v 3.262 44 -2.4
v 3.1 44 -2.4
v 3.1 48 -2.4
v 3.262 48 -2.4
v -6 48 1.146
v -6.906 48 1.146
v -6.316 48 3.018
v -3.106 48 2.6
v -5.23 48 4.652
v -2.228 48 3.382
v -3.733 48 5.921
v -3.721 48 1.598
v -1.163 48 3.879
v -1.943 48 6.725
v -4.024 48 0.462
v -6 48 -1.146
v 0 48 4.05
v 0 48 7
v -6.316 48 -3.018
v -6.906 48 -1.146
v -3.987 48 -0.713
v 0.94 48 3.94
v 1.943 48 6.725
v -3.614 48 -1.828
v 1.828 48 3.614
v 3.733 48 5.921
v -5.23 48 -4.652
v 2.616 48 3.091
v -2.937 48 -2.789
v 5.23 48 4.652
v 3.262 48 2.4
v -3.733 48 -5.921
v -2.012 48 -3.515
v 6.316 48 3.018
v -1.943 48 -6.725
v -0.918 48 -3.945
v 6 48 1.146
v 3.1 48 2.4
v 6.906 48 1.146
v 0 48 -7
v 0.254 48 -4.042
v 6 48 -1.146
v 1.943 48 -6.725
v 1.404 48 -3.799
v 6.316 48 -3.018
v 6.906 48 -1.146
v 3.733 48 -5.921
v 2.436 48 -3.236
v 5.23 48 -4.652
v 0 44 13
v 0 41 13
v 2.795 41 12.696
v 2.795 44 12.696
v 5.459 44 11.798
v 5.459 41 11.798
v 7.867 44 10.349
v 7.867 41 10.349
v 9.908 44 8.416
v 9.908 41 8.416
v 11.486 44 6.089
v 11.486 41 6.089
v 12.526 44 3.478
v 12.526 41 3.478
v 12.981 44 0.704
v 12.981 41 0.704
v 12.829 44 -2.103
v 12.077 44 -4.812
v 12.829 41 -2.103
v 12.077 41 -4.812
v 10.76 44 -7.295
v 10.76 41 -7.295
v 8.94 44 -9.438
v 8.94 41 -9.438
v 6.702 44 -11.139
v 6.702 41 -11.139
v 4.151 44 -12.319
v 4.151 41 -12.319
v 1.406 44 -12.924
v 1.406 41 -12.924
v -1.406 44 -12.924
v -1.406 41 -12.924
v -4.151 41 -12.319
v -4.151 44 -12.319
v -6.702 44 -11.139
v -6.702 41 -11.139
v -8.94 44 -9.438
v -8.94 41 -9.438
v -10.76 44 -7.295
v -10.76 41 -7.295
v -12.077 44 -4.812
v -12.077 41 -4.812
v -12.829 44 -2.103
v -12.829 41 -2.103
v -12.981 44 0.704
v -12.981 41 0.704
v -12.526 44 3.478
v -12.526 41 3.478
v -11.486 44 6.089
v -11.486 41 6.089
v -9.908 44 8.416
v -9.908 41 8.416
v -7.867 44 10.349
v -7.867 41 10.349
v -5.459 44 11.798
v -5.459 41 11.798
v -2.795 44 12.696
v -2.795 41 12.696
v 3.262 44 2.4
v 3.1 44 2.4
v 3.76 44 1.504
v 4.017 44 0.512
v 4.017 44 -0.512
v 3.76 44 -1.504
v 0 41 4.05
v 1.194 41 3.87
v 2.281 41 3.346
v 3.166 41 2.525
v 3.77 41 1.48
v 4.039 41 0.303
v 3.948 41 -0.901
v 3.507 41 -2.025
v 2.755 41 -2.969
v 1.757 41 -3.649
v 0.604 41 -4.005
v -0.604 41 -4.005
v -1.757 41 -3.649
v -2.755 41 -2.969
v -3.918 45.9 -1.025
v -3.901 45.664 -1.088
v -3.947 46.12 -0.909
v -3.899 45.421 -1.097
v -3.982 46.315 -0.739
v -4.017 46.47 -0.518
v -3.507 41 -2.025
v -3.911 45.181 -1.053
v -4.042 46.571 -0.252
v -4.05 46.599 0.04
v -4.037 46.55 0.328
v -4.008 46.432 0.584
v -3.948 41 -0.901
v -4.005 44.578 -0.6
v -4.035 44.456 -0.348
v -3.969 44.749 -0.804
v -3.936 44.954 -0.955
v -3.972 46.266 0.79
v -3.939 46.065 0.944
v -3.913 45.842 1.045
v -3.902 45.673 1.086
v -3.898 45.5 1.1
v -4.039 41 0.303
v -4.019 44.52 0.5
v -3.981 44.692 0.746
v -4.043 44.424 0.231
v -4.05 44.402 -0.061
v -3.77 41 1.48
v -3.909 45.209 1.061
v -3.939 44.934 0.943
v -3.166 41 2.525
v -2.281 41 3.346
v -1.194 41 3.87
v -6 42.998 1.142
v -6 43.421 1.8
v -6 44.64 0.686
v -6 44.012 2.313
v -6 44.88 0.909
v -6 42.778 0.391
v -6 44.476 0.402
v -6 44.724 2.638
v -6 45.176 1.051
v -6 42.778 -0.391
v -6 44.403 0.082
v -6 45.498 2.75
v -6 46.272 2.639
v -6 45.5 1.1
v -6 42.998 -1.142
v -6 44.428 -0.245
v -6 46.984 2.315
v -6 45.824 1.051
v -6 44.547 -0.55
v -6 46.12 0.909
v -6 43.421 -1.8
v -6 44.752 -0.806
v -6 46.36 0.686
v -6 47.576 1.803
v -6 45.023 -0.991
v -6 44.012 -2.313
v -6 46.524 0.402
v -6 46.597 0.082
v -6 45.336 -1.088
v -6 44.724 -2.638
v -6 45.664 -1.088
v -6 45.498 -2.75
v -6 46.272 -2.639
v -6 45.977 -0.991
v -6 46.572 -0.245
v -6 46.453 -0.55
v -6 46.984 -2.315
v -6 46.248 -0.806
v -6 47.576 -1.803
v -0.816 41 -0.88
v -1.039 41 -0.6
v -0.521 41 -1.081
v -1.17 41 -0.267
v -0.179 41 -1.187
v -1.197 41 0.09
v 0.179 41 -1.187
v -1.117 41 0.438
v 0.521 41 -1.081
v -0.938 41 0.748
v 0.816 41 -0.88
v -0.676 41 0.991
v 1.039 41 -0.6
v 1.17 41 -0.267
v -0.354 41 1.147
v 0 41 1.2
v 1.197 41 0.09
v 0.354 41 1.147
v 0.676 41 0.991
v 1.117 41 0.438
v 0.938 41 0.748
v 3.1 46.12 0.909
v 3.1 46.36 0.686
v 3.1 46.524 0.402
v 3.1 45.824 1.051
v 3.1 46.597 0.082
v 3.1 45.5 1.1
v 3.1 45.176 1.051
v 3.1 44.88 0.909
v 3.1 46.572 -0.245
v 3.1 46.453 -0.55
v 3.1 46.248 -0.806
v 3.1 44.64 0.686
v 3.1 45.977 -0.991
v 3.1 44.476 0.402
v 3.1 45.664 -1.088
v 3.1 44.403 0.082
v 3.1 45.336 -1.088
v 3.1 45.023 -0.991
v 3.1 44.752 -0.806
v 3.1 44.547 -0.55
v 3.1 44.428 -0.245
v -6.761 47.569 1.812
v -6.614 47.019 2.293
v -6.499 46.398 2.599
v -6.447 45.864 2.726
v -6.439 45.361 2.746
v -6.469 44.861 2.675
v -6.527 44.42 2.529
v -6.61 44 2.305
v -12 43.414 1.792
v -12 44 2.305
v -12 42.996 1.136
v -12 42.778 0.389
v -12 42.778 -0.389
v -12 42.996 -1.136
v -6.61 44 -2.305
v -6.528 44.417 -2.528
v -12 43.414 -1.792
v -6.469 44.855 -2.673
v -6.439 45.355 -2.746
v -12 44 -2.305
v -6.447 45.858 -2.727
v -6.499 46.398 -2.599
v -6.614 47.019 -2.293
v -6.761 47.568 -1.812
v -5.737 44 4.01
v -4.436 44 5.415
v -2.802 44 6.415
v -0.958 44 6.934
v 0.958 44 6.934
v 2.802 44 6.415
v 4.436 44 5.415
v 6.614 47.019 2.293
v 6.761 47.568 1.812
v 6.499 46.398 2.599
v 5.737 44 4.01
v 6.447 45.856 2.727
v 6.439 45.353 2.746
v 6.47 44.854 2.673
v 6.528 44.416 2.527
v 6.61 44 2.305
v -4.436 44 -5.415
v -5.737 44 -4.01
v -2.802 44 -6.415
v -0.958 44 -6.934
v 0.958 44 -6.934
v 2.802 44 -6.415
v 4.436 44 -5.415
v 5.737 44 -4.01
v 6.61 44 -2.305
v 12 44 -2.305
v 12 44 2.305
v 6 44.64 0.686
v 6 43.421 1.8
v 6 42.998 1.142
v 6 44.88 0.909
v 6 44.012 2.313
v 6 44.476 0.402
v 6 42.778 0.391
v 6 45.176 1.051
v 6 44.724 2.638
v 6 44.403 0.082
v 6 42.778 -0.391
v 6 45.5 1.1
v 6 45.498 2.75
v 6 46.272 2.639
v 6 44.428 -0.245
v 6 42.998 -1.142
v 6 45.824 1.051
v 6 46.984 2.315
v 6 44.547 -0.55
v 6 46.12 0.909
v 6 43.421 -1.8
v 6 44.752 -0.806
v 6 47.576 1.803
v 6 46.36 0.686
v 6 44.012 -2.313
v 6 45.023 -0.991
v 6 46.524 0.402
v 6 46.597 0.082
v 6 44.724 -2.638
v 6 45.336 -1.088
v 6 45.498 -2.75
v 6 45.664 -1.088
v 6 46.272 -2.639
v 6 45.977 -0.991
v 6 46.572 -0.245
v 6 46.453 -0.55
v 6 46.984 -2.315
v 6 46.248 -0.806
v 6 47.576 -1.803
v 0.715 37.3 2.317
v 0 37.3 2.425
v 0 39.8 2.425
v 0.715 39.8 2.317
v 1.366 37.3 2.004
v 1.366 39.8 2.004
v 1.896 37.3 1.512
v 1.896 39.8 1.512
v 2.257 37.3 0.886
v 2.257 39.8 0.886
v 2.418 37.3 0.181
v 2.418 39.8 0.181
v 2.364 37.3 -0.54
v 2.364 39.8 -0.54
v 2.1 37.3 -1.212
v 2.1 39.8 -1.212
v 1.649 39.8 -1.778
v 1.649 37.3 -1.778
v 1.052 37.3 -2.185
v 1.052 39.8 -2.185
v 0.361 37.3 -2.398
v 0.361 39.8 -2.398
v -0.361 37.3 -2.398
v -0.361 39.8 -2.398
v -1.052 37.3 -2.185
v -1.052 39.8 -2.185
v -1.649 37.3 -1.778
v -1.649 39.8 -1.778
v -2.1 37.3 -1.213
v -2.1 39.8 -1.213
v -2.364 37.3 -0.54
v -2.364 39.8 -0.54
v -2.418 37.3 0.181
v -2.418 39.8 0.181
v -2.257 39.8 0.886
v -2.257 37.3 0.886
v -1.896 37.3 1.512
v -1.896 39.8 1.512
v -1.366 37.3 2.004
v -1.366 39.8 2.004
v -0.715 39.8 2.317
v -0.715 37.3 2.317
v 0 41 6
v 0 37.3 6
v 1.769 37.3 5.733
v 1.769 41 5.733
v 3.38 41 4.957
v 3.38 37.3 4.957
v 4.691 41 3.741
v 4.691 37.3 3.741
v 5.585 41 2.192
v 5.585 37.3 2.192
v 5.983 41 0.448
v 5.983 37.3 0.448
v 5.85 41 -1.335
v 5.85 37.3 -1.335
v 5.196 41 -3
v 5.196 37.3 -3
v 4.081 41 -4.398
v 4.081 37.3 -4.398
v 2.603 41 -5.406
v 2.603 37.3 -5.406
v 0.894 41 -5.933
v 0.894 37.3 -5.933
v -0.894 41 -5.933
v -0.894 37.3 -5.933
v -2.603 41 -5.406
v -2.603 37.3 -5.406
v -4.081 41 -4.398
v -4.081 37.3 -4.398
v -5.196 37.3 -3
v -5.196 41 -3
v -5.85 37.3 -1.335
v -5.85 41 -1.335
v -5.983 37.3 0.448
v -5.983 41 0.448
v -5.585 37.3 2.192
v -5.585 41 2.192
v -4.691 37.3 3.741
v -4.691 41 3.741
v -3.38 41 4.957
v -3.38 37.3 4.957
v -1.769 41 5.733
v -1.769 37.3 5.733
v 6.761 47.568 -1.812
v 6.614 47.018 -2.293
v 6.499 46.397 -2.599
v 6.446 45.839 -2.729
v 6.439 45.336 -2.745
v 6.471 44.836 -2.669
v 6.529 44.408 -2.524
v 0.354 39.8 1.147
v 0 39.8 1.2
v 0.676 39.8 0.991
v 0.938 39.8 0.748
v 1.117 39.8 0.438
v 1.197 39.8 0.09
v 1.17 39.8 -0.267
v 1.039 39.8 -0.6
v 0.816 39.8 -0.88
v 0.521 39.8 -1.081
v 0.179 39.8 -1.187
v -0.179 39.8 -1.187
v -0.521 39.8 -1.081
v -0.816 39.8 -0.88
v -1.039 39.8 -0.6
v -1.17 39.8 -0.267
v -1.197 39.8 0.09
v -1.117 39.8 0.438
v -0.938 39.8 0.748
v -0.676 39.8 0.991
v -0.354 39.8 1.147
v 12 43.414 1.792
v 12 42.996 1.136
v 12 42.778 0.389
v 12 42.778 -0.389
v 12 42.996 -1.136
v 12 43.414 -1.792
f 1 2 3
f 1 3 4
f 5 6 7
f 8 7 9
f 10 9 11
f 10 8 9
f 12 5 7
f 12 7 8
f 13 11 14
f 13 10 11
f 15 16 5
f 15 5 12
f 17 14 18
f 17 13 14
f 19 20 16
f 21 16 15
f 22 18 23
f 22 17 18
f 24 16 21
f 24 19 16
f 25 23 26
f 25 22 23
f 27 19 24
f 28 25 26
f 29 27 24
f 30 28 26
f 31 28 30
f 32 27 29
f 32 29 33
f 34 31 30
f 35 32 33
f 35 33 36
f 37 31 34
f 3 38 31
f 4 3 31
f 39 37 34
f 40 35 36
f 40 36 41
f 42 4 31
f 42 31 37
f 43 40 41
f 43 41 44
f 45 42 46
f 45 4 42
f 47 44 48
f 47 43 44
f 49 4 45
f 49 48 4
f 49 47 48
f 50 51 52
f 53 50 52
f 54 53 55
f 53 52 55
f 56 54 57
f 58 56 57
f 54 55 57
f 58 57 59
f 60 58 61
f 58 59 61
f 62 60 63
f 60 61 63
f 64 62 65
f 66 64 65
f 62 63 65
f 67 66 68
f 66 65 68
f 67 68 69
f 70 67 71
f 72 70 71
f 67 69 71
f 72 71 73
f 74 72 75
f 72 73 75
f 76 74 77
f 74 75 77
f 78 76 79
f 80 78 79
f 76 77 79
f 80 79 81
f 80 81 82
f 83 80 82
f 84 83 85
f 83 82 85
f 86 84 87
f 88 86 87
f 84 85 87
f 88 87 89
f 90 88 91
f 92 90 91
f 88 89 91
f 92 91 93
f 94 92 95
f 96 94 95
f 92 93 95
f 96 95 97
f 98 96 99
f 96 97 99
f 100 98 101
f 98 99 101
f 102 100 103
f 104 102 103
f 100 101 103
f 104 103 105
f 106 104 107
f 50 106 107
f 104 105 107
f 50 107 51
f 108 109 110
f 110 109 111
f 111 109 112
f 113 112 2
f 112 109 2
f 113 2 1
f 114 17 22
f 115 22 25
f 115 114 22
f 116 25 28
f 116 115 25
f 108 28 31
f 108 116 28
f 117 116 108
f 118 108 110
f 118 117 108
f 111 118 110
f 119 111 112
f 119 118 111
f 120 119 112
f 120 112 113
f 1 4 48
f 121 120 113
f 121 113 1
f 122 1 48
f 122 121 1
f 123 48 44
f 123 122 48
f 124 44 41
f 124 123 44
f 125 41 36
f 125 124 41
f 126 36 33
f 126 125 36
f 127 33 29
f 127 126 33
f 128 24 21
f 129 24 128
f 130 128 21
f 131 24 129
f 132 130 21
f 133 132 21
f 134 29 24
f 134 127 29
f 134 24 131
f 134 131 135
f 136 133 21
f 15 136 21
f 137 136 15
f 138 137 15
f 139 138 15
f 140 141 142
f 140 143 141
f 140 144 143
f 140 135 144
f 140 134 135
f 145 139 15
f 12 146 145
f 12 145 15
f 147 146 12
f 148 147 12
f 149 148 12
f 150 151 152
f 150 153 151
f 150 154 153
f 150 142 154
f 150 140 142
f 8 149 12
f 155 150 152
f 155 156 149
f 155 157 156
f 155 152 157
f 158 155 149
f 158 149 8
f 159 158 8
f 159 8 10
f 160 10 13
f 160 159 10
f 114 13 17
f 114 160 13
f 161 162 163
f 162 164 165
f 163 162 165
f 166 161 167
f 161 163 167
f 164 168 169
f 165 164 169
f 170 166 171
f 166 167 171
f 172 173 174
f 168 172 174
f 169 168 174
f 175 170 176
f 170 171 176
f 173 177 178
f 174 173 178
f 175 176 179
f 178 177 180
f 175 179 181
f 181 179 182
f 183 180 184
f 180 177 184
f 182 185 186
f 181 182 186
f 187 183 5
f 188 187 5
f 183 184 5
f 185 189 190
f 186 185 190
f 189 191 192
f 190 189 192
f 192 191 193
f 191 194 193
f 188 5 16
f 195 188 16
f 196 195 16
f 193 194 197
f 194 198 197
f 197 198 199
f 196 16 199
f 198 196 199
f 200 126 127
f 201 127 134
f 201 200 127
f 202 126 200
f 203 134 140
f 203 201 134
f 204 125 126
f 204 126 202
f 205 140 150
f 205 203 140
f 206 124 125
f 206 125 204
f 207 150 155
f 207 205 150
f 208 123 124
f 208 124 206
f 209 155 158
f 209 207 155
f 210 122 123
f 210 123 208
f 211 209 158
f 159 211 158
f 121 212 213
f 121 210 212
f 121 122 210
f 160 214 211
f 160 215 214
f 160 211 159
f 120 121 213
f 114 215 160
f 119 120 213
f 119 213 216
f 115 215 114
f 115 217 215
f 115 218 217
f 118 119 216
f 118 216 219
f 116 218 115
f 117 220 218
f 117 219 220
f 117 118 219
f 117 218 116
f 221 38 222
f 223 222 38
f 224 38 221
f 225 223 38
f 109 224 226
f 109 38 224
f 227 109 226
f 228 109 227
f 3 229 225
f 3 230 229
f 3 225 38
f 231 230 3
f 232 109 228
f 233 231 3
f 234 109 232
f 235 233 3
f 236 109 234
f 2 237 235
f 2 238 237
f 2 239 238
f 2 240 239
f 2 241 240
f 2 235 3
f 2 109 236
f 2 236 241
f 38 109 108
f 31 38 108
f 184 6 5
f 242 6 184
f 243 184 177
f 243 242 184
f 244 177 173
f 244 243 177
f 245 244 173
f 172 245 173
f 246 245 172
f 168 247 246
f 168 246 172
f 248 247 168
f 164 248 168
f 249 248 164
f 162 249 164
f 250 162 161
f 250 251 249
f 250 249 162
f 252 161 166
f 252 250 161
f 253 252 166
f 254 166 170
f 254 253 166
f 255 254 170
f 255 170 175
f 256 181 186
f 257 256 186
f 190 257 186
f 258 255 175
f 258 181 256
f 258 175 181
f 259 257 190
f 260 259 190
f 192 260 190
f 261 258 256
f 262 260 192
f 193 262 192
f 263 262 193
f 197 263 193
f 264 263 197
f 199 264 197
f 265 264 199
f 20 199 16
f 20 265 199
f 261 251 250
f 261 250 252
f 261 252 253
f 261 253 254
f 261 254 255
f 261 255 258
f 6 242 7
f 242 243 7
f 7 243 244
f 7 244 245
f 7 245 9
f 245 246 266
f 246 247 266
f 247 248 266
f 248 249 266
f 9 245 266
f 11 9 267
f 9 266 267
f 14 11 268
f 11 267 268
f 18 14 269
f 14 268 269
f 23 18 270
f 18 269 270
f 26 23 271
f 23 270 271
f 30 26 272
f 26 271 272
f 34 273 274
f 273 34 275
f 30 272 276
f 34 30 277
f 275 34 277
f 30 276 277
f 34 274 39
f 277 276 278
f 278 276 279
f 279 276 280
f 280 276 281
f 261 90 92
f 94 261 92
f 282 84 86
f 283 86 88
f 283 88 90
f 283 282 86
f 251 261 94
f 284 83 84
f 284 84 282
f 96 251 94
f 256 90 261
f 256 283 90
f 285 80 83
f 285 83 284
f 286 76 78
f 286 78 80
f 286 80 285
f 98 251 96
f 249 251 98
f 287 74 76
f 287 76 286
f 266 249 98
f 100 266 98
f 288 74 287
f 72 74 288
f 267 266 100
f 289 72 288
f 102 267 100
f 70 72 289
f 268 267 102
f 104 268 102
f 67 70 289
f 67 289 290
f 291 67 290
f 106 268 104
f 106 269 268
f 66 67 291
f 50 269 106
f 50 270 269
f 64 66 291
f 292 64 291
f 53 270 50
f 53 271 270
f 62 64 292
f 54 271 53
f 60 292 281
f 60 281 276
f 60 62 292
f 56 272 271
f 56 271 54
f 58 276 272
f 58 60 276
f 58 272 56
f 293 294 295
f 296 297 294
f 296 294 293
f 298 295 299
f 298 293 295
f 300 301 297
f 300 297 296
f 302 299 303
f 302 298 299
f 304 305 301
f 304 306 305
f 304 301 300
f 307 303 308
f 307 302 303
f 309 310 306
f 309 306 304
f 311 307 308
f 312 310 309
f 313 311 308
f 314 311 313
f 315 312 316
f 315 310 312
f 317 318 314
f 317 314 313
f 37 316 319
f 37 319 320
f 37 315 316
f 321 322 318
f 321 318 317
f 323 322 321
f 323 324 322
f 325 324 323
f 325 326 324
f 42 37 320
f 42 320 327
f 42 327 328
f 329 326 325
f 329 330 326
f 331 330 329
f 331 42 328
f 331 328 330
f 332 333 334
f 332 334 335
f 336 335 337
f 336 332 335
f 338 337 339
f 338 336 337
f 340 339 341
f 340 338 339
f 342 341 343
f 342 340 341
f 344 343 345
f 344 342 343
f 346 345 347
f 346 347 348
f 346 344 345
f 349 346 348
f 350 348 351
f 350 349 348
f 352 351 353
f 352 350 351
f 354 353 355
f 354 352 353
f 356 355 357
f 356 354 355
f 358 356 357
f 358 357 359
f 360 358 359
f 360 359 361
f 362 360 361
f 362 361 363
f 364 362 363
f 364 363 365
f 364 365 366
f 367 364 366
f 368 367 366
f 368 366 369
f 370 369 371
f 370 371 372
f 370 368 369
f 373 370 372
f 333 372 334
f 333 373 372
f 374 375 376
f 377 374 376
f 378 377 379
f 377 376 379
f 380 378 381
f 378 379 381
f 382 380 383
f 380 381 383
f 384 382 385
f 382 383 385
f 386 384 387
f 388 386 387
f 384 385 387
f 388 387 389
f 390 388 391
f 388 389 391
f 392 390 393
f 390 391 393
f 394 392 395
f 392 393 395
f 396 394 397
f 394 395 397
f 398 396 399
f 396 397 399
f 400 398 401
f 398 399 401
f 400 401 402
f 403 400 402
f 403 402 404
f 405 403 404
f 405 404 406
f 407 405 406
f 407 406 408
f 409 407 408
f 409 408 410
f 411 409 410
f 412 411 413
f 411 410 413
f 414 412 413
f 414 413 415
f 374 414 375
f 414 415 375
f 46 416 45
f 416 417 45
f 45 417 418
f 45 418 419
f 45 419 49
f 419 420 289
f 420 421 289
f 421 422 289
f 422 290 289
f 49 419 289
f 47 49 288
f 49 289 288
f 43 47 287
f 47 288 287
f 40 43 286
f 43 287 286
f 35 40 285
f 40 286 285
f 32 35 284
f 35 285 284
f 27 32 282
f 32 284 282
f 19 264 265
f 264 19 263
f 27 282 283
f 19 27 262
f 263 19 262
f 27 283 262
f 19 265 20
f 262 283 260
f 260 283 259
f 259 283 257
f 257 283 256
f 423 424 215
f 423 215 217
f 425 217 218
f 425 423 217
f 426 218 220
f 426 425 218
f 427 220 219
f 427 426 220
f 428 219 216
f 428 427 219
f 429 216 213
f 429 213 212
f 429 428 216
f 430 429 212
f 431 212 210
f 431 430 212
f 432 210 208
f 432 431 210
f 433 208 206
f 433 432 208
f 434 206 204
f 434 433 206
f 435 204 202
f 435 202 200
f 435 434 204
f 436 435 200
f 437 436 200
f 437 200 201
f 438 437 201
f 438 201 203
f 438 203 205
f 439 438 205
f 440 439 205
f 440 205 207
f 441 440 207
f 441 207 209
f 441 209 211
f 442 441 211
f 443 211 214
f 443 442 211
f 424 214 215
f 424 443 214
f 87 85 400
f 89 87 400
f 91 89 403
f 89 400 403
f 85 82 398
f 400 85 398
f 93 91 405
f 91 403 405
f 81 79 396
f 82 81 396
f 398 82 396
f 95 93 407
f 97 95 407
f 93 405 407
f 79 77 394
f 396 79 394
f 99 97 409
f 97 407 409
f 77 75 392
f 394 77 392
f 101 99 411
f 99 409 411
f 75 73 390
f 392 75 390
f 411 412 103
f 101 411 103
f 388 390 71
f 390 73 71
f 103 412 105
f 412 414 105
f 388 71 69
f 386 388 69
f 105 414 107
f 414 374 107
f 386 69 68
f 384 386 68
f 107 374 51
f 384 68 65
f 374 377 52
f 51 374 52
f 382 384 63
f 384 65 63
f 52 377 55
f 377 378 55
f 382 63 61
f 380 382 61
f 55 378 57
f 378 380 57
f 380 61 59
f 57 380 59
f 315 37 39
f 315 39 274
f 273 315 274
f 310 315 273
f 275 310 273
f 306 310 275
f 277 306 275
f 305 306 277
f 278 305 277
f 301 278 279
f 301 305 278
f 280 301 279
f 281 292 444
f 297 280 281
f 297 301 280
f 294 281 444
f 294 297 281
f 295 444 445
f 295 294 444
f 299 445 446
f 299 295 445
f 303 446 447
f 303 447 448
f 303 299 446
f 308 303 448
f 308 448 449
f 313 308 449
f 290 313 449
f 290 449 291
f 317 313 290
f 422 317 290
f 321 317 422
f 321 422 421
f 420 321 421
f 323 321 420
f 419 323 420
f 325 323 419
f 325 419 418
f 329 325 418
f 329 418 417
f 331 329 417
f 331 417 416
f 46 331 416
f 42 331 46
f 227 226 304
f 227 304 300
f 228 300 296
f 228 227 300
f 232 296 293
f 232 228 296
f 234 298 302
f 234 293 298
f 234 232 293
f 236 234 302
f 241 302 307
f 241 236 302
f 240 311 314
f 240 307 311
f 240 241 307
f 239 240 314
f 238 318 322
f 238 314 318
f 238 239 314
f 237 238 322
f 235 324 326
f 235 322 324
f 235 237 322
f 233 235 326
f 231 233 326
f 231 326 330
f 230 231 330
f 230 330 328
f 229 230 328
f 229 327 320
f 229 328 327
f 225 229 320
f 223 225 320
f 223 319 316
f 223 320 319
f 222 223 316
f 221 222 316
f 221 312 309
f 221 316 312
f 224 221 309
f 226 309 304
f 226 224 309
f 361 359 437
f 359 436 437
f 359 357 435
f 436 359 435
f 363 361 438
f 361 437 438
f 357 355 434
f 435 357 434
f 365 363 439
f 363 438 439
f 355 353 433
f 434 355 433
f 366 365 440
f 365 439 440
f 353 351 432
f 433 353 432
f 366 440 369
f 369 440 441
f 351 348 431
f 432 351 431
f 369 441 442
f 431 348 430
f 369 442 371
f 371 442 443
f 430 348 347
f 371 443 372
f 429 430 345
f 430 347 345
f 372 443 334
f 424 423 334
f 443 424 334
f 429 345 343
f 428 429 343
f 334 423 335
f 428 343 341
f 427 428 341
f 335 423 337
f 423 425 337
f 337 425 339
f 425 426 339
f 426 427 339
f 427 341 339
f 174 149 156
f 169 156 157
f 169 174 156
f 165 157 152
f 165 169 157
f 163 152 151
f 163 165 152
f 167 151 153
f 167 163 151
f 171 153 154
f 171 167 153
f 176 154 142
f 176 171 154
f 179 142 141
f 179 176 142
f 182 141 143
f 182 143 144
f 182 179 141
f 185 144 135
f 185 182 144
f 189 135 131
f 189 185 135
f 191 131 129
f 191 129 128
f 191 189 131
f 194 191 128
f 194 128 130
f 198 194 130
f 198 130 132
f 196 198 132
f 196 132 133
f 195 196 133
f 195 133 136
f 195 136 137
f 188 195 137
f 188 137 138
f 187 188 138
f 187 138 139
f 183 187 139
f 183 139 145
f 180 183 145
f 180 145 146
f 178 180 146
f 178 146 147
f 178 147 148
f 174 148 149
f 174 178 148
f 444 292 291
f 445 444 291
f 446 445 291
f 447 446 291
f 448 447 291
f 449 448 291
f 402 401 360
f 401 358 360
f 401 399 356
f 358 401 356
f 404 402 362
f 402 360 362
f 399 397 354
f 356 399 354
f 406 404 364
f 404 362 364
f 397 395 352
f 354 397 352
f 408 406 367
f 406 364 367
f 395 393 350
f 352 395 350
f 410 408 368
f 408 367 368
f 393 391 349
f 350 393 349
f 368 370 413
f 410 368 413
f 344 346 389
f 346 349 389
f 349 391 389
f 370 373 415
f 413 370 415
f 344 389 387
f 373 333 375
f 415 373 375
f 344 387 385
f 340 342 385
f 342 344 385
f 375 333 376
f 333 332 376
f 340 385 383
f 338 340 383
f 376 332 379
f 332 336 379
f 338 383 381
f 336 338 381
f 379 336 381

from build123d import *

# Parameters (mm, degrees)
STOCK_HORN_DRIVE_FLANGE_START                 = 41
STOCK_HORN_DRIVE_FLANGE_PROFILE_R             = 13
STOCK_HORN_DRIVE_FLANGE_PROFILE_R_2           = 4.05
STOCK_HORN_DRIVE_FLANGE_DEPTH                 = 3
D_COUPLING_RING_START                         = 44
D_COUPLING_RING_PROFILE_R                     = 7
D_COUPLING_RING_PROFILE_R_2                   = 4.05
D_COUPLING_RING_DEPTH                         = 4
D_KEY_LAND_START                              = 44
D_KEY_LAND_PROFILE_W                          = 2.9
D_KEY_LAND_PROFILE_H                          = 4.8
D_KEY_LAND_DEPTH                              = 4
YAW_POSITIVE_RETENTION_CROSSBOLT_START        = -10
YAW_POSITIVE_RETENTION_CROSSBOLT_PROFILE_R    = 1.1
YAW_POSITIVE_RETENTION_CROSSBOLT_DEPTH        = 62.400389104
CROSSBOLT_FLAT_SEAT_CUT_12_START              = -12
CROSSBOLT_FLAT_SEAT_12_R                      = 2.75
CROSSBOLT_FLAT_SEAT_CUT_12_DEPTH              = 6
CROSSBOLT_FLAT_SEAT_CUT_6_START               = 6
CROSSBOLT_FLAT_SEAT_6_R                       = 2.75
CROSSBOLT_FLAT_SEAT_CUT_6_DEPTH               = 6
SG90_SPLINE_SOCKET_BOSS_OD12_START            = 37.3
SG90_SPLINE_SOCKET_BOSS_PROFILE_R             = 6
SG90_SPLINE_SOCKET_BOSS_OD12_DEPTH            = 3.7
SG90_SPLINE_PRESS_SOCKET_D4P85_DEPTH2P5_START = 37.3
SG90_SPLINE_PRESS_SOCKET_D4P85_DEPTH_2_R      = 2.425
SG90_SPLINE_PRESS_SOCKET_D4P85_DEPTH2P5_DEPTH = 2.5
SG90_CENTRE_SCREW_CLEARANCE_D2P4_START        = 39.8
SG90_CENTRE_SCREW_CLEARANCE_D2P4_PROFILE_R    = 1.2
SG90_CENTRE_SCREW_CLEARANCE_D2P4_DEPTH        = 1.2


with BuildPart() as part:
    # Stock_horn_drive_flange_profile → Stock_horn_drive_flange (new body)
    with BuildSketch(Plane(origin=(0, 0, 0), x_dir=(1, 0, 0), z_dir=(0, 1, 0)).offset(STOCK_HORN_DRIVE_FLANGE_START)):
        with Locations(Location((0, 0, 0), (0, 0, 270))):
            Circle(STOCK_HORN_DRIVE_FLANGE_PROFILE_R)
        with Locations(Location((0, 0, 0), (0, 0, 270))):
            Circle(STOCK_HORN_DRIVE_FLANGE_PROFILE_R_2, mode=Mode.SUBTRACT)
    extrude(amount=STOCK_HORN_DRIVE_FLANGE_DEPTH)

    # D_coupling_ring_profile → D_coupling_ring (add)
    with BuildSketch(Plane(origin=(0, 0, 0), x_dir=(1, 0, 0), z_dir=(0, 1, 0)).offset(D_COUPLING_RING_START)):
        with Locations(Location((0, 0, 0), (0, 0, 270))):
            Circle(D_COUPLING_RING_PROFILE_R)
        with Locations(Location((0, 0, 0), (0, 0, 270))):
            Circle(D_COUPLING_RING_PROFILE_R_2, mode=Mode.SUBTRACT)
    extrude(amount=D_COUPLING_RING_DEPTH)

    # D_key_land_profile → D_key_land (add)
    with BuildSketch(Plane(origin=(0, 0, 0), x_dir=(1, 0, 0), z_dir=(0, 1, 0)).offset(D_KEY_LAND_START)):
        with Locations((4.55, 0)):
            Rectangle(D_KEY_LAND_PROFILE_W, D_KEY_LAND_PROFILE_H)
    extrude(amount=D_KEY_LAND_DEPTH)

    # Yaw_positive_retention_crossbolt_profile → Yaw_positive_retention_crossbolt (cut, through all)
    with BuildSketch(Plane(origin=(0, 0, 0), x_dir=(0, 0, -1), z_dir=(1, 0, 0)).offset(YAW_POSITIVE_RETENTION_CROSSBOLT_START)):
        with Locations(Location((0, 45.5, 0), (0, 0, 180))):
            Circle(YAW_POSITIVE_RETENTION_CROSSBOLT_PROFILE_R)
    extrude(amount=YAW_POSITIVE_RETENTION_CROSSBOLT_DEPTH, mode=Mode.SUBTRACT)

    # Crossbolt_flat_seat_-12 → Crossbolt_flat_seat_cut_-12 (cut)
    with BuildSketch(Plane(origin=(0, 0, 0), x_dir=(0, 0, -1), z_dir=(1, 0, 0)).offset(CROSSBOLT_FLAT_SEAT_CUT_12_START)):
        with Locations((0, 45.5)):
            Circle(CROSSBOLT_FLAT_SEAT_12_R)
    extrude(amount=CROSSBOLT_FLAT_SEAT_CUT_12_DEPTH, mode=Mode.SUBTRACT)

    # Crossbolt_flat_seat_6 → Crossbolt_flat_seat_cut_6 (cut)
    with BuildSketch(Plane(origin=(0, 0, 0), x_dir=(0, 0, -1), z_dir=(1, 0, 0)).offset(CROSSBOLT_FLAT_SEAT_CUT_6_START)):
        with Locations((0, 45.5)):
            Circle(CROSSBOLT_FLAT_SEAT_6_R)
    extrude(amount=CROSSBOLT_FLAT_SEAT_CUT_6_DEPTH, mode=Mode.SUBTRACT)

    # SG90_spline_socket_boss_profile → SG90_spline_socket_boss_OD12 (add)
    with BuildSketch(Plane(origin=(0, 0, 0), x_dir=(1, 0, 0), z_dir=(0, 1, 0)).offset(SG90_SPLINE_SOCKET_BOSS_OD12_START)):
        with Locations(Location((0, 0, 0), (0, 0, 270))):
            Circle(SG90_SPLINE_SOCKET_BOSS_PROFILE_R)
    extrude(amount=SG90_SPLINE_SOCKET_BOSS_OD12_DEPTH)

    # SG90_spline_press_socket_D4p85_depth 2 → SG90_spline_press_socket_D4p85_depth2p5 (cut)
    with BuildSketch(Plane(origin=(0, 0, 0), x_dir=(1, 0, 0), z_dir=(0, 1, 0)).offset(SG90_SPLINE_PRESS_SOCKET_D4P85_DEPTH2P5_START)):
        with Locations(Location((0, 0, 0), (0, 0, 270))):
            Circle(SG90_SPLINE_PRESS_SOCKET_D4P85_DEPTH_2_R)
    extrude(amount=SG90_SPLINE_PRESS_SOCKET_D4P85_DEPTH2P5_DEPTH, mode=Mode.SUBTRACT)

    # SG90_centre_screw_clearance_D2p4_profile → SG90_centre_screw_clearance_D2p4 (cut)
    with BuildSketch(Plane(origin=(0, 0, 0), x_dir=(1, 0, 0), z_dir=(0, 1, 0)).offset(SG90_CENTRE_SCREW_CLEARANCE_D2P4_START)):
        with Locations(Location((0, 0, 0), (0, 0, 270))):
            Circle(SG90_CENTRE_SCREW_CLEARANCE_D2P4_PROFILE_R)
    extrude(amount=SG90_CENTRE_SCREW_CLEARANCE_D2P4_DEPTH, mode=Mode.SUBTRACT)


solid = part.part
